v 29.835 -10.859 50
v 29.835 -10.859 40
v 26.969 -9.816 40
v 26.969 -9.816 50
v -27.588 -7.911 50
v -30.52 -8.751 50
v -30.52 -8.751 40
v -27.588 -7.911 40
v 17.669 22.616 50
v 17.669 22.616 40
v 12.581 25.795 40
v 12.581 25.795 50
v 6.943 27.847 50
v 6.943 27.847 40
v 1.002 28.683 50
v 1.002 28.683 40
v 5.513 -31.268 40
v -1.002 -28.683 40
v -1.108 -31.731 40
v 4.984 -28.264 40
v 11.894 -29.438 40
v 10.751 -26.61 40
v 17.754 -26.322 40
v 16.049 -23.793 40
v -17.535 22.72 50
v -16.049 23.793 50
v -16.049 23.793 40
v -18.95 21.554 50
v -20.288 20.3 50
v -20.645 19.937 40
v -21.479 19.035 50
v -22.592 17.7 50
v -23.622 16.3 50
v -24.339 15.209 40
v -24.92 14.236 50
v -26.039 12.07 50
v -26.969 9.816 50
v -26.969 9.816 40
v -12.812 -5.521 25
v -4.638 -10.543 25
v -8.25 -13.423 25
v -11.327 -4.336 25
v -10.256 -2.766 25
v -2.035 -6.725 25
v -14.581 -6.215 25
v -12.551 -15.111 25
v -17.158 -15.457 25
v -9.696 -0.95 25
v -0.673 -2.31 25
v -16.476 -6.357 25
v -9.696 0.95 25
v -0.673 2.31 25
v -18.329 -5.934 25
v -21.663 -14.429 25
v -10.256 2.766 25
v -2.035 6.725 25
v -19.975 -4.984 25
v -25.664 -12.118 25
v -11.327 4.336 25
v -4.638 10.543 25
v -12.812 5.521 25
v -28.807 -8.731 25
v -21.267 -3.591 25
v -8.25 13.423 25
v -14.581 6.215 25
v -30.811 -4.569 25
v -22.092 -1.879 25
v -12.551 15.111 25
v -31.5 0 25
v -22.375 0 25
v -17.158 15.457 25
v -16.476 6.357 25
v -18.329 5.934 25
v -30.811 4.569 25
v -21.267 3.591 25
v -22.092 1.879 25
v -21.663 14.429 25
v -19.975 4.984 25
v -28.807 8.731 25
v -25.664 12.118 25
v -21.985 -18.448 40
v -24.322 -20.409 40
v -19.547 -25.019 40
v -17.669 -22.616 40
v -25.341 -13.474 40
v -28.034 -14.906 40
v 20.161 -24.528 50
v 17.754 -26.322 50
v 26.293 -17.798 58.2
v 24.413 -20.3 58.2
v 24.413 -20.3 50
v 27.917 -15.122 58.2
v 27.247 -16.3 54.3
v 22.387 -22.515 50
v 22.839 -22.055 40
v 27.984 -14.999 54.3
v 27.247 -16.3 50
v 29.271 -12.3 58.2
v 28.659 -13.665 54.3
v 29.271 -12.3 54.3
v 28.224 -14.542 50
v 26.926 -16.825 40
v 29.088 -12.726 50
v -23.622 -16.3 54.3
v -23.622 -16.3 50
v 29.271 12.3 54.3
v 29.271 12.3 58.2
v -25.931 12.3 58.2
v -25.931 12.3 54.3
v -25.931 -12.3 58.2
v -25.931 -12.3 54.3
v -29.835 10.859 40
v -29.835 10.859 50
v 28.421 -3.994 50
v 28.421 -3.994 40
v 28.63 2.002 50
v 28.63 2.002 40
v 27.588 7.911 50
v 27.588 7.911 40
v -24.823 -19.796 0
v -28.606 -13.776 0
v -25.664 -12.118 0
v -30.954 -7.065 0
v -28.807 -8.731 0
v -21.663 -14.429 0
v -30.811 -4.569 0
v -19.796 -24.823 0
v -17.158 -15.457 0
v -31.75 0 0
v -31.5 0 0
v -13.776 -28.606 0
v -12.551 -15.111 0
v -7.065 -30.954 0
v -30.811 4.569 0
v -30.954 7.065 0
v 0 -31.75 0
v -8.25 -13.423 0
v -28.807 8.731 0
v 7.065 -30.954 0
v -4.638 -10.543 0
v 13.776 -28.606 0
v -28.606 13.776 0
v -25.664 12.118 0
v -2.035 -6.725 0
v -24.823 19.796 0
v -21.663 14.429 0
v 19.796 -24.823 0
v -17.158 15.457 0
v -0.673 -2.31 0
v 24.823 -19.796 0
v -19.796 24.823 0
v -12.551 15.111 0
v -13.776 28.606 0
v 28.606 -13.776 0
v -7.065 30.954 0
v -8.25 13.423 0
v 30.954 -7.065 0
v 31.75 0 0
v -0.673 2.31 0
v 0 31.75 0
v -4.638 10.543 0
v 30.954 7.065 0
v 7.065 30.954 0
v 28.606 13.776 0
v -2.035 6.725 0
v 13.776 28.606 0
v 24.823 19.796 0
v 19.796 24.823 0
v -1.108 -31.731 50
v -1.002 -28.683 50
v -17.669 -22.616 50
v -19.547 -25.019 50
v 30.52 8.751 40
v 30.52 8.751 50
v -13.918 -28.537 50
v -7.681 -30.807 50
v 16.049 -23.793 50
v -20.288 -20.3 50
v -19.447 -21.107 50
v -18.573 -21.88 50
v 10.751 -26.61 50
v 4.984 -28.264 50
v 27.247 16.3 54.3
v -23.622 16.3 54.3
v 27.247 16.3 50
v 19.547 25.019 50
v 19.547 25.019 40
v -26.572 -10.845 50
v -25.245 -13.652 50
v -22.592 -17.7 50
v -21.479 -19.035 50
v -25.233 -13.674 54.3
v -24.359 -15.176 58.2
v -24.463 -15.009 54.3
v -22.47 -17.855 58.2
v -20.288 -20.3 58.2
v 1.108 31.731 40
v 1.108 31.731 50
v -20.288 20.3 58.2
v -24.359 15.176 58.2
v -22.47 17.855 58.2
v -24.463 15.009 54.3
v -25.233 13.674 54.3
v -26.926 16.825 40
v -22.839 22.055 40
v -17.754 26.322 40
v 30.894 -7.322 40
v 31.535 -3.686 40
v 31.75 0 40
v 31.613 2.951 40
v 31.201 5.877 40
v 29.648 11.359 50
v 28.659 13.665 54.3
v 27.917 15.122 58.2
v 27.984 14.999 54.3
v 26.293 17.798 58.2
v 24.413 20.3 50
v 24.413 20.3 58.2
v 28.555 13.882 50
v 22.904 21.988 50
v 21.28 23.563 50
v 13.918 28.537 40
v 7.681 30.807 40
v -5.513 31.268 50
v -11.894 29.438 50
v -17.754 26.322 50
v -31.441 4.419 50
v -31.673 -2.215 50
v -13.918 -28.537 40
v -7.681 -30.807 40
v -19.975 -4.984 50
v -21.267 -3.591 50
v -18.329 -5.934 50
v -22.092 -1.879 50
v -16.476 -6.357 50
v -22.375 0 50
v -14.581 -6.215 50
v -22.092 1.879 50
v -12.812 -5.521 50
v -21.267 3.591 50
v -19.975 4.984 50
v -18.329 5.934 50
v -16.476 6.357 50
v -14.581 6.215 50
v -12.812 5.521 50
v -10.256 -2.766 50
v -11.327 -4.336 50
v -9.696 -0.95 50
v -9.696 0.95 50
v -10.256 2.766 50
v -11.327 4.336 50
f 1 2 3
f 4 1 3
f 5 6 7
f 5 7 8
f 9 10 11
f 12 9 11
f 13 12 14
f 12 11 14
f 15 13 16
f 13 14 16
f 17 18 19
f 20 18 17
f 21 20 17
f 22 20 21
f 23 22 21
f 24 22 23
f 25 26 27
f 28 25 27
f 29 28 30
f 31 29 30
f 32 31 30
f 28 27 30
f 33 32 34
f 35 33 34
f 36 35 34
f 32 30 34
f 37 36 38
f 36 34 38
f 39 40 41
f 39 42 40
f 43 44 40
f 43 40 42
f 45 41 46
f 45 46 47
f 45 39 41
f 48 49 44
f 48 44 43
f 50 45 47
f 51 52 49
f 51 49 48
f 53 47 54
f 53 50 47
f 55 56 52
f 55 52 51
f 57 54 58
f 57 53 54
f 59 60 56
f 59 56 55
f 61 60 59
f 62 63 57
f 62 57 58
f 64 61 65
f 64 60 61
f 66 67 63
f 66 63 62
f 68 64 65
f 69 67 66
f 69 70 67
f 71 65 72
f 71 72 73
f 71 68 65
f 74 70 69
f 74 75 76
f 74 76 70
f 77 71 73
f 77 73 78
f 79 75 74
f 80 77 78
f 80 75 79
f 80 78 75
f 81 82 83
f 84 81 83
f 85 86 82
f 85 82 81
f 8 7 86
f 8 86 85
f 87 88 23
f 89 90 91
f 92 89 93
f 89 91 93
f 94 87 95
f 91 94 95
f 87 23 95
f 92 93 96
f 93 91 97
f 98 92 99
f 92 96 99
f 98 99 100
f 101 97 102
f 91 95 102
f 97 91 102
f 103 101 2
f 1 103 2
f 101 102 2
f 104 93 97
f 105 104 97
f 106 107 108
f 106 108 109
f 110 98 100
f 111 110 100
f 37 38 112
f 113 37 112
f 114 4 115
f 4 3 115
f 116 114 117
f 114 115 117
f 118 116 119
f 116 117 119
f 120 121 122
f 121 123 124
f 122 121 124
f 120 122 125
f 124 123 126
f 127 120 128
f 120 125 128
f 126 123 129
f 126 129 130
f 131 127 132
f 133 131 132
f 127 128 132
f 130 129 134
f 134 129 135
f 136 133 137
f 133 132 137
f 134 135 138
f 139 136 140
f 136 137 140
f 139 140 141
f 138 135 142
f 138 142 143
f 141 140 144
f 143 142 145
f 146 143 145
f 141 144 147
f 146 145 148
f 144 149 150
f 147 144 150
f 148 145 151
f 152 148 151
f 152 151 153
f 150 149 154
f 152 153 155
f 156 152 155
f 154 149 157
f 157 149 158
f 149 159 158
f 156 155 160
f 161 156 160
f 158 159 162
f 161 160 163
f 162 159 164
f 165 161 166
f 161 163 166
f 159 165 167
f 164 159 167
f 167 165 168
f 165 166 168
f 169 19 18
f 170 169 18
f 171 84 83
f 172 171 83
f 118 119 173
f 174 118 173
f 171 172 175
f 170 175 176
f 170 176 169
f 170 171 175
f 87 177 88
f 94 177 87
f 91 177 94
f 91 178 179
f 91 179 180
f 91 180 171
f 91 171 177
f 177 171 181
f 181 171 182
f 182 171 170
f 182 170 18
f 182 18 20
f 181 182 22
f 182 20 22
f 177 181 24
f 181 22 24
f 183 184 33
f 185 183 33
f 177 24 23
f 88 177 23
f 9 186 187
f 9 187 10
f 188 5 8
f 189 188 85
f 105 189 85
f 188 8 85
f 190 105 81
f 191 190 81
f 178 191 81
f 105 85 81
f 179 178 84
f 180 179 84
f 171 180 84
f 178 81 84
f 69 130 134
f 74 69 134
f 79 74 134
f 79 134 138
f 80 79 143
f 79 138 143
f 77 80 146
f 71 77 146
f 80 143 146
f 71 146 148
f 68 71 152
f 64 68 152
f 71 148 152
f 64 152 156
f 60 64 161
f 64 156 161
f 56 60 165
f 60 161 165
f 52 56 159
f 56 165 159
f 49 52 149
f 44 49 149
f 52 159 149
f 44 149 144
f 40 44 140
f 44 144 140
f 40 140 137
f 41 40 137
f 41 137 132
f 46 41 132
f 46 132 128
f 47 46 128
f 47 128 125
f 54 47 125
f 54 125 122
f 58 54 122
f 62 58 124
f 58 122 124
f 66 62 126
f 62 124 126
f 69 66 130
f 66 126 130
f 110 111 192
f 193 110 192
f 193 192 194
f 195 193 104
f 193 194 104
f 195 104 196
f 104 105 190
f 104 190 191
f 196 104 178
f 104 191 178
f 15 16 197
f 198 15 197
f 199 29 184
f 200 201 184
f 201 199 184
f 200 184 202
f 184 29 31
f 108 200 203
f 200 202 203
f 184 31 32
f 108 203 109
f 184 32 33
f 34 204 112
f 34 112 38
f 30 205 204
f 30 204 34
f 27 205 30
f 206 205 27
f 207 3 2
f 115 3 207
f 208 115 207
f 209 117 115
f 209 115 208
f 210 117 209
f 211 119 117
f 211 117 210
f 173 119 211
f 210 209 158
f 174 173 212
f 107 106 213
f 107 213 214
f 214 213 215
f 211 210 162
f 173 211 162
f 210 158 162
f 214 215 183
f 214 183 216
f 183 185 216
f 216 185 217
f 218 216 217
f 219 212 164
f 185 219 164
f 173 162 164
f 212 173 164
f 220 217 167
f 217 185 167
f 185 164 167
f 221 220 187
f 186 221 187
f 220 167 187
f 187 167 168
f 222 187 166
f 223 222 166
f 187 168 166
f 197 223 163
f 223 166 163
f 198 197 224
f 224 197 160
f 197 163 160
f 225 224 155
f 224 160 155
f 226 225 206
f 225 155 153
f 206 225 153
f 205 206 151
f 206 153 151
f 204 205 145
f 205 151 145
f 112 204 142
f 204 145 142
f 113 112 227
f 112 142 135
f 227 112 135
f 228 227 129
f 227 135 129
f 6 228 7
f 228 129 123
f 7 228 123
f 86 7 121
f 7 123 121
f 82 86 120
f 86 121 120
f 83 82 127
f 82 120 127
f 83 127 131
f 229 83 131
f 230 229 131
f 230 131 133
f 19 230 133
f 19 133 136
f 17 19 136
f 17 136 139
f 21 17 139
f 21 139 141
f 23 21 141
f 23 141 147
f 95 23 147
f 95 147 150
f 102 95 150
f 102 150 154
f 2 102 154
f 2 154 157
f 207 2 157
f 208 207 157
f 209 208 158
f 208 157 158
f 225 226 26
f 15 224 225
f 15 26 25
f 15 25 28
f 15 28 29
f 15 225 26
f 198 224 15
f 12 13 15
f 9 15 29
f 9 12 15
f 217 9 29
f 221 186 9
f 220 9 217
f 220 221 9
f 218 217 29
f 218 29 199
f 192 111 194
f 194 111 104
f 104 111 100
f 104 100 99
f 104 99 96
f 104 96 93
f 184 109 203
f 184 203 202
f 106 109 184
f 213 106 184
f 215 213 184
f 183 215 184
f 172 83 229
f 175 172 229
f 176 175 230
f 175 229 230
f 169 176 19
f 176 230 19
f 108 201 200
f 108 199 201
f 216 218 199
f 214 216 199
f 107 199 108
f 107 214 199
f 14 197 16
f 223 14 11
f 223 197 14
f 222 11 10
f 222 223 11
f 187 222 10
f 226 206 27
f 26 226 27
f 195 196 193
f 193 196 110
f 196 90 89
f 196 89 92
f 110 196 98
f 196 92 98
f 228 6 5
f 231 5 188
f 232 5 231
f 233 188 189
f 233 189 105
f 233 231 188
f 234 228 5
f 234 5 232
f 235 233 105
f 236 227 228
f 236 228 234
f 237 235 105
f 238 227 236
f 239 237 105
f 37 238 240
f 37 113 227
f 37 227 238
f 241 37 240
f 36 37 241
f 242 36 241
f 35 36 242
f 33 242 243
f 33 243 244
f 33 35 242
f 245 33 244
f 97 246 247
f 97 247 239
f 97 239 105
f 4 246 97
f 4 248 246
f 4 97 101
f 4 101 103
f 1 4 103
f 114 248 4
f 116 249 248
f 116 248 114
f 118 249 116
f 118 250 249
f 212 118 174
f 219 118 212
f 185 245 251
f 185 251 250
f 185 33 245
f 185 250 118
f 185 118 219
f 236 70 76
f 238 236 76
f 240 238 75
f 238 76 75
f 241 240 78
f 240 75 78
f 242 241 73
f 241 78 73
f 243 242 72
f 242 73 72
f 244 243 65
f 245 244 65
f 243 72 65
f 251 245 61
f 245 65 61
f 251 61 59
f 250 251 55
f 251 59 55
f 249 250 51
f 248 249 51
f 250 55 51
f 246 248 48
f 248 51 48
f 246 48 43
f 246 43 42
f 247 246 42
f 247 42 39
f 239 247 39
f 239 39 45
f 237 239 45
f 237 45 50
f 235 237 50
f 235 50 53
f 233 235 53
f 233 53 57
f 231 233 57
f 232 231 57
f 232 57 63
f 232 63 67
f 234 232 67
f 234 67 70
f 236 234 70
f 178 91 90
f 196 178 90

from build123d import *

# Parameters (mm, degrees)
SKETCH1_R           = 28.7
BOSS_EXTRUDE1_DEPTH = 50
SKETCH1_3_R         = 31.75
SKETCH1_3_R_2       = 28.7
BOSS_EXTRUDE2_DEPTH = 40
SKETCH3_R           = 6.375
CUT_EXTRUDE1_DEPTH  = 50
SKETCH3_3_R         = 15.5
SKETCH3_3_R_2       = 6.375
CUT_EXTRUDE2_DEPTH  = 25
BOSS_EXTRUDE3_START = -10
BOSS_EXTRUDE3_DEPTH = 10
BOSS_EXTRUDE4_DEPTH = 30
SKETCH7_OUTSIDE_W   = 86.902
SKETCH7_OUTSIDE_H   = 86.902
CUT_EXTRUDE3_DEPTH  = 68.202120502


# Read off the part's stored shape, not the designer's step: Boss-Extrude3
with BuildPart() as part:
    # Sketch1 → Boss-Extrude1 (new body)
    with BuildSketch(Plane.XY):
        Circle(SKETCH1_R)
    extrude(amount=BOSS_EXTRUDE1_DEPTH)

    # Sketch1<3> → Boss-Extrude2 (add)
    with BuildSketch(Plane.XY):
        Circle(SKETCH1_3_R)
        Circle(SKETCH1_3_R_2, mode=Mode.SUBTRACT)
    extrude(amount=BOSS_EXTRUDE2_DEPTH)

    # Sketch3 → Cut-Extrude1 (cut)
    with BuildSketch(Plane(origin=(0, 0, 0), x_dir=(-1, 0, 0), z_dir=(0, 0, -1))):
        with Locations((16, 0)):
            Circle(SKETCH3_R)
    extrude(amount=-CUT_EXTRUDE1_DEPTH, mode=Mode.SUBTRACT)

    # Sketch3<3> → Cut-Extrude2 (cut)
    with BuildSketch(Plane(origin=(0, 0, 0), x_dir=(-1, 0, 0), z_dir=(0, 0, -1))):
        with Locations((16, 0)):
            Circle(SKETCH3_3_R)
        with Locations(Location((16, 0, 0), (0, 0, 180))):
            Circle(SKETCH3_3_R_2, mode=Mode.SUBTRACT)
    extrude(amount=-CUT_EXTRUDE2_DEPTH, mode=Mode.SUBTRACT)

    # Boss-Extrude3 outline → Boss-Extrude3 (add)
    with BuildSketch(Plane.XY.offset(50).offset(BOSS_EXTRUDE3_START)):
        with BuildLine():
            Line((-30.520058846, -8.751486047), (-27.588210673, -7.910792112))
            ThreePointArc((-27.588210673, -7.910792112), (-28.682516735, 1.001615555), (-26.969178217, 9.815978113))
            Line((-26.969178217, 9.815978113), (-29.83524071, 10.859139551))
            ThreePointArc((-29.83524071, 10.859139551), (-31.730658758, 1.108059021), (-30.520058846, -8.751486047))
        make_face()
        with BuildLine():
            ThreePointArc((-1.001615555, -28.682516735), (-9.815978113, -26.969178217), (-17.669484342, -22.615908629))
            Line((-17.669484342, -22.615908629), (-19.547251842, -25.019341427))
            ThreePointArc((-19.547251842, -25.019341427), (-10.859139551, -29.83524071), (-1.10805902, -31.730658758))
            Line((-1.10805902, -31.730658758), (-1.001615555, -28.682516735))
        make_face()
        with BuildLine():
            Line((-17.754374685, 26.321942929), (-16.04883633, 23.793378332))
            ThreePointArc((-16.04883633, 23.793378332), (-7.910792112, 27.588210673), (1.001615555, 28.682516735))
            Line((1.001615555, 28.682516735), (1.10805902, 31.730658758))
            ThreePointArc((1.10805902, 31.730658758), (-8.751486047, 30.520058846), (-17.754374685, 26.321942929))
        make_face()
        with BuildLine():
            ThreePointArc((26.969178217, -9.815978113), (22.615908629, -17.669484341), (16.04883633, -23.793378332))
            Line((16.04883633, -23.793378332), (17.754374685, -26.321942929))
            ThreePointArc((17.754374685, -26.321942929), (25.019341427, -19.547251842), (29.83524071, -10.859139551))
            Line((29.83524071, -10.859139551), (26.969178217, -9.815978113))
        make_face()
        with BuildLine():
            Line((19.547251842, 25.019341427), (17.669484342, 22.615908629))
            ThreePointArc((17.669484342, 22.615908629), (23.793378332, 16.04883633), (27.588210673, 7.910792112))
            Line((27.588210673, 7.910792112), (30.520058846, 8.751486047))
            ThreePointArc((30.520058846, 8.751486047), (26.321942929, 17.754374685), (19.547251842, 25.019341427))
        make_face()
    extrude(amount=BOSS_EXTRUDE3_DEPTH)

    # Sketch5 → Boss-Extrude4 (add, symmetric)
    with BuildSketch(Plane(origin=(0, 0, 0), x_dir=(0, 0, -1), z_dir=(1, 0, 0))):
        Polygon((-58.2, -12.3), (-54.3, -12.3), (-54.3, -16.3), (-50, -16.3), (-50, -20.3), (-58.2, -20.3), align=None)
    boss_extrude4 = extrude(amount=BOSS_EXTRUDE4_DEPTH, both=True)

    # Mirror1: Boss-Extrude4 across plane
    add(boss_extrude4.mirror(Plane.ZX))

    # Sketch7 outside → Cut-Extrude3 (cut, through all)
    with BuildSketch(Plane.XY.offset(50)):
        Rectangle(SKETCH7_OUTSIDE_W, SKETCH7_OUTSIDE_H)
        with BuildLine():
            Line((-17.669484342, -22.615908629), (-19.547251842, -25.019341427))
            ThreePointArc((-19.547251842, -25.019341427), (-10.859139551, -29.83524071), (-1.10805902, -31.730658758))
            Line((-1.10805902, -31.730658758), (-1.001615555, -28.682516735))
            ThreePointArc((-1.001615555, -28.682516735), (7.910792112, -27.588210673), (16.04883633, -23.793378332))
            Line((16.04883633, -23.793378332), (17.754374685, -26.321942929))
            ThreePointArc((17.754374685, -26.321942929), (25.019341427, -19.547251842), (29.83524071, -10.859139551))
            Line((29.83524071, -10.859139551), (26.969178217, -9.815978113))
            ThreePointArc((26.969178217, -9.815978113), (28.682516735, -1.001615555), (27.588210673, 7.910792112))
            Line((27.588210673, 7.910792112), (30.520058846, 8.751486047))
            ThreePointArc((30.520058846, 8.751486047), (26.321942929, 17.754374685), (19.547251842, 25.019341427))
            Line((19.547251842, 25.019341427), (17.669484342, 22.615908629))
            ThreePointArc((17.669484342, 22.615908629), (9.815978113, 26.969178217), (1.001615555, 28.682516735))
            Line((1.001615555, 28.682516735), (1.10805902, 31.730658758))
            ThreePointArc((1.10805902, 31.730658758), (-8.751486047, 30.520058846), (-17.754374685, 26.321942929))
            Line((-17.754374685, 26.321942929), (-16.04883633, 23.793378332))
            ThreePointArc((-16.04883633, 23.793378332), (-22.615908629, 17.669484342), (-26.969178217, 9.815978113))
            Line((-26.969178217, 9.815978113), (-29.83524071, 10.859139551))
            ThreePointArc((-29.83524071, 10.859139551), (-31.730658758, 1.10805902), (-30.520058846, -8.751486047))
            Line((-30.520058846, -8.751486047), (-27.588210673, -7.910792112))
            ThreePointArc((-27.588210673, -7.910792112), (-23.793378332, -16.04883633), (-17.669484342, -22.615908629))
        make_face(mode=Mode.SUBTRACT)
    extrude(amount=CUT_EXTRUDE3_DEPTH, mode=Mode.SUBTRACT)


solid = part.part
